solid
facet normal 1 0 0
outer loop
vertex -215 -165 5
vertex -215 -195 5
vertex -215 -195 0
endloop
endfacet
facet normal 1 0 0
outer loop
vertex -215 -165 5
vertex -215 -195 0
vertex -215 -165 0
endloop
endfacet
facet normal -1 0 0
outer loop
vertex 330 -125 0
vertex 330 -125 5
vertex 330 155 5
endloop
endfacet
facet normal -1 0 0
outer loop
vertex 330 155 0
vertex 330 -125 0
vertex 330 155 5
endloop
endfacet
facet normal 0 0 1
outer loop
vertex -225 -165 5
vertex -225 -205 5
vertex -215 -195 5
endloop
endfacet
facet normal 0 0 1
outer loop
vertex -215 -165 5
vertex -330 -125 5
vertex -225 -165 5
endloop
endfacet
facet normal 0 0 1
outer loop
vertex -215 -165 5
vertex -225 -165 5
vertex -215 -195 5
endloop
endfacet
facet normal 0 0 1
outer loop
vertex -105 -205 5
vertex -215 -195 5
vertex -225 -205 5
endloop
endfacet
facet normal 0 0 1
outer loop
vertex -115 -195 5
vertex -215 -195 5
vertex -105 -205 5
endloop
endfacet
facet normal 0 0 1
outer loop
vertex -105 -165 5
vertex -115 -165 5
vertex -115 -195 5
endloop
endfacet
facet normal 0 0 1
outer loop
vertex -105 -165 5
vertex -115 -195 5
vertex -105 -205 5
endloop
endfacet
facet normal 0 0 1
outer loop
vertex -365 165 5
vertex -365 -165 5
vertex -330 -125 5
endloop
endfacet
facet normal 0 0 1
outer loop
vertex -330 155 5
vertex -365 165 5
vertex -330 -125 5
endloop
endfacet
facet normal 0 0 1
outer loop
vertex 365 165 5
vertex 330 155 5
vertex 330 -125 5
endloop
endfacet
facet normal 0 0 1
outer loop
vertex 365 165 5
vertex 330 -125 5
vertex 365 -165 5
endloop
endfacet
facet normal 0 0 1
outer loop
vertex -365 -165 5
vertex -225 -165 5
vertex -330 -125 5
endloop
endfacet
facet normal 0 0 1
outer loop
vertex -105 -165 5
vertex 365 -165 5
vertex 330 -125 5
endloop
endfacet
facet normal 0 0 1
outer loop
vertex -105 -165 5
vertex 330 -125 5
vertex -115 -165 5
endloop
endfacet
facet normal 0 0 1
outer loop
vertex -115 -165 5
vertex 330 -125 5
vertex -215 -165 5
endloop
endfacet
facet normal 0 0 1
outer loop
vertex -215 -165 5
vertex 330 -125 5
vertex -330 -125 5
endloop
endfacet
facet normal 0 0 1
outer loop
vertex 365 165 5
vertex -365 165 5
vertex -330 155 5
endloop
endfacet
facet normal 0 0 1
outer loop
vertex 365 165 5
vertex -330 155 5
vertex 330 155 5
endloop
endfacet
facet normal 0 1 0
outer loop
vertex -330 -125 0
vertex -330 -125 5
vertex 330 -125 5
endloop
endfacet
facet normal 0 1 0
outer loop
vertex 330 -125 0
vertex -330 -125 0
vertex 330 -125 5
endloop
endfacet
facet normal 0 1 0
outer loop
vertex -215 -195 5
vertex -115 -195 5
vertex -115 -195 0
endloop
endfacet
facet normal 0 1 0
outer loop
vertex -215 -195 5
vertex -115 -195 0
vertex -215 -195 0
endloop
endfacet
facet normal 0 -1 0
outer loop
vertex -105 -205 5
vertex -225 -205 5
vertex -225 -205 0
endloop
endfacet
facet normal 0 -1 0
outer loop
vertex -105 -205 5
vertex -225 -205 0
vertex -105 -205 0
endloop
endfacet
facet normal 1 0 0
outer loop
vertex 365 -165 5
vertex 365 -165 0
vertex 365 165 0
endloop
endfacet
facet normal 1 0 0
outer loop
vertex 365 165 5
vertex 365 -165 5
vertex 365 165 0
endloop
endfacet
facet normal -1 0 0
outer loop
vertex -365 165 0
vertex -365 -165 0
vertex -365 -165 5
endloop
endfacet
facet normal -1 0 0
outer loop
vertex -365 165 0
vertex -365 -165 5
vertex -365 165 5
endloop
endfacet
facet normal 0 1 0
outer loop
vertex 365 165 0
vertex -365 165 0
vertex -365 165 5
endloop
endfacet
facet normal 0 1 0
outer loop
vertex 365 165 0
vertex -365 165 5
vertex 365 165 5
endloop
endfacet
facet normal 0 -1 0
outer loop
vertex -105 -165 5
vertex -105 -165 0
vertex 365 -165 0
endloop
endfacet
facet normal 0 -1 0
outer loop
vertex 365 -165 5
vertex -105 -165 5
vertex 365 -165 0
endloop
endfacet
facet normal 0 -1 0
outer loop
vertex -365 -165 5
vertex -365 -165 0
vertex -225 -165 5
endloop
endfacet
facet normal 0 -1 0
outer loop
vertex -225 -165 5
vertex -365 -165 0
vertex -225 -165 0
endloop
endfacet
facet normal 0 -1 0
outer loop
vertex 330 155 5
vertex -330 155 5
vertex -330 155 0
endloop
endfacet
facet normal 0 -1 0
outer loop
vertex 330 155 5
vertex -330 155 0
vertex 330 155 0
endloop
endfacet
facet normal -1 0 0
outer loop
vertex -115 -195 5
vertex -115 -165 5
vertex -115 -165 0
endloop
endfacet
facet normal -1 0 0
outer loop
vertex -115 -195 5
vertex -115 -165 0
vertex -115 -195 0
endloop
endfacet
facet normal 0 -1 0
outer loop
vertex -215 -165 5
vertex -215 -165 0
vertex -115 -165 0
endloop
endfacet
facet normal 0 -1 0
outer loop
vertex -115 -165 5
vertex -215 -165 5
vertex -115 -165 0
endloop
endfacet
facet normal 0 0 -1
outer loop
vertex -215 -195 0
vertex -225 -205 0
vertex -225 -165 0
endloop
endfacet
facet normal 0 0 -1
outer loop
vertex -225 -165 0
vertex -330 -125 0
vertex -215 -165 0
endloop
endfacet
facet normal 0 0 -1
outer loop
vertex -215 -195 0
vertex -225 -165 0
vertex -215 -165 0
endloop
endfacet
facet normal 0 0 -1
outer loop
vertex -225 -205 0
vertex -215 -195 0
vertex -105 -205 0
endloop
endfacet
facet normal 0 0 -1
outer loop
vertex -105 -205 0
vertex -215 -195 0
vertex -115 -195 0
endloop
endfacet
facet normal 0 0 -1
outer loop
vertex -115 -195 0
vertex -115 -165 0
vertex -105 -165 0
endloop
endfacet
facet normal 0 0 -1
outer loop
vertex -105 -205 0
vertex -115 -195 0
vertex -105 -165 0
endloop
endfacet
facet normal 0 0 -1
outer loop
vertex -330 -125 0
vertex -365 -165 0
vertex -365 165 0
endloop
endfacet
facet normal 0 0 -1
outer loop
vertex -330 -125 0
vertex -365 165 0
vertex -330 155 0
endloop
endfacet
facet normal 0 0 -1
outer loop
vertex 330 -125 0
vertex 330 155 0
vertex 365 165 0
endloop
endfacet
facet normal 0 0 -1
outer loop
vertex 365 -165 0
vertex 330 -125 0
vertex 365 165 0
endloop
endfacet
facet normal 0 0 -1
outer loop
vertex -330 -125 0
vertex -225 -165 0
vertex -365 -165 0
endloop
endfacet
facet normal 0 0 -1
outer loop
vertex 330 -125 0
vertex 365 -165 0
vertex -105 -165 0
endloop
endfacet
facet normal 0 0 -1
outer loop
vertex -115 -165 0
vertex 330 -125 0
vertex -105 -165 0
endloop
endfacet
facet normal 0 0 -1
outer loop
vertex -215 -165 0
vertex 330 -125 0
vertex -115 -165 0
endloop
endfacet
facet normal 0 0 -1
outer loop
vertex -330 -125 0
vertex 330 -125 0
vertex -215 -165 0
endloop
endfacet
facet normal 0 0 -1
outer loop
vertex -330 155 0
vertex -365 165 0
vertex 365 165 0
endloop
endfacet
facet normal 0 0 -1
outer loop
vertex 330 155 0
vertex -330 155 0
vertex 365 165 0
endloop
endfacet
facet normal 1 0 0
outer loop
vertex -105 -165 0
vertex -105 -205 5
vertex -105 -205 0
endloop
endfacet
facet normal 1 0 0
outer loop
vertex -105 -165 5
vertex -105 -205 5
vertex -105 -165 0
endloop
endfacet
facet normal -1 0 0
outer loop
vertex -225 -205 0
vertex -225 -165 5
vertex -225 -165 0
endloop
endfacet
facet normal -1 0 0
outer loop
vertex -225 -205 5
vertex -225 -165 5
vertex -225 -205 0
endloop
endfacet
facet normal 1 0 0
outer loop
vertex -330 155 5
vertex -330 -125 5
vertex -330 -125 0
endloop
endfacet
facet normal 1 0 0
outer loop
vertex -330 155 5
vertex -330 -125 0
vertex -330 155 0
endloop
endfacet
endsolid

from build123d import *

# Parameters (mm, degrees)
CROQUIS2_W              = 730
CROQUIS2_H              = 330
SALIENTE_EXTRUIR2_DEPTH = 5
CROQUIS4_W              = 660
CROQUIS4_H              = 280
CORTAR_EXTRUIR1_DEPTH   = 5
SALIENTE_EXTRUIR3_DEPTH = 5


with BuildPart() as part:
    # Croquis2 → Saliente-Extruir2 (new body)
    with BuildSketch(Plane.XY):
        Rectangle(CROQUIS2_W, CROQUIS2_H)
    extrude(amount=SALIENTE_EXTRUIR2_DEPTH)

    # Croquis4 → Cortar-Extruir1 (cut)
    with BuildSketch(Plane.XY.offset(5)):
        with Locations((0, 15)):
            Rectangle(CROQUIS4_W, CROQUIS4_H)
    extrude(amount=-CORTAR_EXTRUIR1_DEPTH, mode=Mode.SUBTRACT)

    # Croquis5 → Saliente-Extruir3 (add)
    with BuildSketch(Plane.XY.offset(5)):
        Polygon((-215, -165), (-225, -165), (-225, -205), (-105, -205), (-105, -165), (-115, -165), (-115, -195), (-215, -195), align=None)
    extrude(amount=-SALIENTE_EXTRUIR3_DEPTH)


solid = part.part
